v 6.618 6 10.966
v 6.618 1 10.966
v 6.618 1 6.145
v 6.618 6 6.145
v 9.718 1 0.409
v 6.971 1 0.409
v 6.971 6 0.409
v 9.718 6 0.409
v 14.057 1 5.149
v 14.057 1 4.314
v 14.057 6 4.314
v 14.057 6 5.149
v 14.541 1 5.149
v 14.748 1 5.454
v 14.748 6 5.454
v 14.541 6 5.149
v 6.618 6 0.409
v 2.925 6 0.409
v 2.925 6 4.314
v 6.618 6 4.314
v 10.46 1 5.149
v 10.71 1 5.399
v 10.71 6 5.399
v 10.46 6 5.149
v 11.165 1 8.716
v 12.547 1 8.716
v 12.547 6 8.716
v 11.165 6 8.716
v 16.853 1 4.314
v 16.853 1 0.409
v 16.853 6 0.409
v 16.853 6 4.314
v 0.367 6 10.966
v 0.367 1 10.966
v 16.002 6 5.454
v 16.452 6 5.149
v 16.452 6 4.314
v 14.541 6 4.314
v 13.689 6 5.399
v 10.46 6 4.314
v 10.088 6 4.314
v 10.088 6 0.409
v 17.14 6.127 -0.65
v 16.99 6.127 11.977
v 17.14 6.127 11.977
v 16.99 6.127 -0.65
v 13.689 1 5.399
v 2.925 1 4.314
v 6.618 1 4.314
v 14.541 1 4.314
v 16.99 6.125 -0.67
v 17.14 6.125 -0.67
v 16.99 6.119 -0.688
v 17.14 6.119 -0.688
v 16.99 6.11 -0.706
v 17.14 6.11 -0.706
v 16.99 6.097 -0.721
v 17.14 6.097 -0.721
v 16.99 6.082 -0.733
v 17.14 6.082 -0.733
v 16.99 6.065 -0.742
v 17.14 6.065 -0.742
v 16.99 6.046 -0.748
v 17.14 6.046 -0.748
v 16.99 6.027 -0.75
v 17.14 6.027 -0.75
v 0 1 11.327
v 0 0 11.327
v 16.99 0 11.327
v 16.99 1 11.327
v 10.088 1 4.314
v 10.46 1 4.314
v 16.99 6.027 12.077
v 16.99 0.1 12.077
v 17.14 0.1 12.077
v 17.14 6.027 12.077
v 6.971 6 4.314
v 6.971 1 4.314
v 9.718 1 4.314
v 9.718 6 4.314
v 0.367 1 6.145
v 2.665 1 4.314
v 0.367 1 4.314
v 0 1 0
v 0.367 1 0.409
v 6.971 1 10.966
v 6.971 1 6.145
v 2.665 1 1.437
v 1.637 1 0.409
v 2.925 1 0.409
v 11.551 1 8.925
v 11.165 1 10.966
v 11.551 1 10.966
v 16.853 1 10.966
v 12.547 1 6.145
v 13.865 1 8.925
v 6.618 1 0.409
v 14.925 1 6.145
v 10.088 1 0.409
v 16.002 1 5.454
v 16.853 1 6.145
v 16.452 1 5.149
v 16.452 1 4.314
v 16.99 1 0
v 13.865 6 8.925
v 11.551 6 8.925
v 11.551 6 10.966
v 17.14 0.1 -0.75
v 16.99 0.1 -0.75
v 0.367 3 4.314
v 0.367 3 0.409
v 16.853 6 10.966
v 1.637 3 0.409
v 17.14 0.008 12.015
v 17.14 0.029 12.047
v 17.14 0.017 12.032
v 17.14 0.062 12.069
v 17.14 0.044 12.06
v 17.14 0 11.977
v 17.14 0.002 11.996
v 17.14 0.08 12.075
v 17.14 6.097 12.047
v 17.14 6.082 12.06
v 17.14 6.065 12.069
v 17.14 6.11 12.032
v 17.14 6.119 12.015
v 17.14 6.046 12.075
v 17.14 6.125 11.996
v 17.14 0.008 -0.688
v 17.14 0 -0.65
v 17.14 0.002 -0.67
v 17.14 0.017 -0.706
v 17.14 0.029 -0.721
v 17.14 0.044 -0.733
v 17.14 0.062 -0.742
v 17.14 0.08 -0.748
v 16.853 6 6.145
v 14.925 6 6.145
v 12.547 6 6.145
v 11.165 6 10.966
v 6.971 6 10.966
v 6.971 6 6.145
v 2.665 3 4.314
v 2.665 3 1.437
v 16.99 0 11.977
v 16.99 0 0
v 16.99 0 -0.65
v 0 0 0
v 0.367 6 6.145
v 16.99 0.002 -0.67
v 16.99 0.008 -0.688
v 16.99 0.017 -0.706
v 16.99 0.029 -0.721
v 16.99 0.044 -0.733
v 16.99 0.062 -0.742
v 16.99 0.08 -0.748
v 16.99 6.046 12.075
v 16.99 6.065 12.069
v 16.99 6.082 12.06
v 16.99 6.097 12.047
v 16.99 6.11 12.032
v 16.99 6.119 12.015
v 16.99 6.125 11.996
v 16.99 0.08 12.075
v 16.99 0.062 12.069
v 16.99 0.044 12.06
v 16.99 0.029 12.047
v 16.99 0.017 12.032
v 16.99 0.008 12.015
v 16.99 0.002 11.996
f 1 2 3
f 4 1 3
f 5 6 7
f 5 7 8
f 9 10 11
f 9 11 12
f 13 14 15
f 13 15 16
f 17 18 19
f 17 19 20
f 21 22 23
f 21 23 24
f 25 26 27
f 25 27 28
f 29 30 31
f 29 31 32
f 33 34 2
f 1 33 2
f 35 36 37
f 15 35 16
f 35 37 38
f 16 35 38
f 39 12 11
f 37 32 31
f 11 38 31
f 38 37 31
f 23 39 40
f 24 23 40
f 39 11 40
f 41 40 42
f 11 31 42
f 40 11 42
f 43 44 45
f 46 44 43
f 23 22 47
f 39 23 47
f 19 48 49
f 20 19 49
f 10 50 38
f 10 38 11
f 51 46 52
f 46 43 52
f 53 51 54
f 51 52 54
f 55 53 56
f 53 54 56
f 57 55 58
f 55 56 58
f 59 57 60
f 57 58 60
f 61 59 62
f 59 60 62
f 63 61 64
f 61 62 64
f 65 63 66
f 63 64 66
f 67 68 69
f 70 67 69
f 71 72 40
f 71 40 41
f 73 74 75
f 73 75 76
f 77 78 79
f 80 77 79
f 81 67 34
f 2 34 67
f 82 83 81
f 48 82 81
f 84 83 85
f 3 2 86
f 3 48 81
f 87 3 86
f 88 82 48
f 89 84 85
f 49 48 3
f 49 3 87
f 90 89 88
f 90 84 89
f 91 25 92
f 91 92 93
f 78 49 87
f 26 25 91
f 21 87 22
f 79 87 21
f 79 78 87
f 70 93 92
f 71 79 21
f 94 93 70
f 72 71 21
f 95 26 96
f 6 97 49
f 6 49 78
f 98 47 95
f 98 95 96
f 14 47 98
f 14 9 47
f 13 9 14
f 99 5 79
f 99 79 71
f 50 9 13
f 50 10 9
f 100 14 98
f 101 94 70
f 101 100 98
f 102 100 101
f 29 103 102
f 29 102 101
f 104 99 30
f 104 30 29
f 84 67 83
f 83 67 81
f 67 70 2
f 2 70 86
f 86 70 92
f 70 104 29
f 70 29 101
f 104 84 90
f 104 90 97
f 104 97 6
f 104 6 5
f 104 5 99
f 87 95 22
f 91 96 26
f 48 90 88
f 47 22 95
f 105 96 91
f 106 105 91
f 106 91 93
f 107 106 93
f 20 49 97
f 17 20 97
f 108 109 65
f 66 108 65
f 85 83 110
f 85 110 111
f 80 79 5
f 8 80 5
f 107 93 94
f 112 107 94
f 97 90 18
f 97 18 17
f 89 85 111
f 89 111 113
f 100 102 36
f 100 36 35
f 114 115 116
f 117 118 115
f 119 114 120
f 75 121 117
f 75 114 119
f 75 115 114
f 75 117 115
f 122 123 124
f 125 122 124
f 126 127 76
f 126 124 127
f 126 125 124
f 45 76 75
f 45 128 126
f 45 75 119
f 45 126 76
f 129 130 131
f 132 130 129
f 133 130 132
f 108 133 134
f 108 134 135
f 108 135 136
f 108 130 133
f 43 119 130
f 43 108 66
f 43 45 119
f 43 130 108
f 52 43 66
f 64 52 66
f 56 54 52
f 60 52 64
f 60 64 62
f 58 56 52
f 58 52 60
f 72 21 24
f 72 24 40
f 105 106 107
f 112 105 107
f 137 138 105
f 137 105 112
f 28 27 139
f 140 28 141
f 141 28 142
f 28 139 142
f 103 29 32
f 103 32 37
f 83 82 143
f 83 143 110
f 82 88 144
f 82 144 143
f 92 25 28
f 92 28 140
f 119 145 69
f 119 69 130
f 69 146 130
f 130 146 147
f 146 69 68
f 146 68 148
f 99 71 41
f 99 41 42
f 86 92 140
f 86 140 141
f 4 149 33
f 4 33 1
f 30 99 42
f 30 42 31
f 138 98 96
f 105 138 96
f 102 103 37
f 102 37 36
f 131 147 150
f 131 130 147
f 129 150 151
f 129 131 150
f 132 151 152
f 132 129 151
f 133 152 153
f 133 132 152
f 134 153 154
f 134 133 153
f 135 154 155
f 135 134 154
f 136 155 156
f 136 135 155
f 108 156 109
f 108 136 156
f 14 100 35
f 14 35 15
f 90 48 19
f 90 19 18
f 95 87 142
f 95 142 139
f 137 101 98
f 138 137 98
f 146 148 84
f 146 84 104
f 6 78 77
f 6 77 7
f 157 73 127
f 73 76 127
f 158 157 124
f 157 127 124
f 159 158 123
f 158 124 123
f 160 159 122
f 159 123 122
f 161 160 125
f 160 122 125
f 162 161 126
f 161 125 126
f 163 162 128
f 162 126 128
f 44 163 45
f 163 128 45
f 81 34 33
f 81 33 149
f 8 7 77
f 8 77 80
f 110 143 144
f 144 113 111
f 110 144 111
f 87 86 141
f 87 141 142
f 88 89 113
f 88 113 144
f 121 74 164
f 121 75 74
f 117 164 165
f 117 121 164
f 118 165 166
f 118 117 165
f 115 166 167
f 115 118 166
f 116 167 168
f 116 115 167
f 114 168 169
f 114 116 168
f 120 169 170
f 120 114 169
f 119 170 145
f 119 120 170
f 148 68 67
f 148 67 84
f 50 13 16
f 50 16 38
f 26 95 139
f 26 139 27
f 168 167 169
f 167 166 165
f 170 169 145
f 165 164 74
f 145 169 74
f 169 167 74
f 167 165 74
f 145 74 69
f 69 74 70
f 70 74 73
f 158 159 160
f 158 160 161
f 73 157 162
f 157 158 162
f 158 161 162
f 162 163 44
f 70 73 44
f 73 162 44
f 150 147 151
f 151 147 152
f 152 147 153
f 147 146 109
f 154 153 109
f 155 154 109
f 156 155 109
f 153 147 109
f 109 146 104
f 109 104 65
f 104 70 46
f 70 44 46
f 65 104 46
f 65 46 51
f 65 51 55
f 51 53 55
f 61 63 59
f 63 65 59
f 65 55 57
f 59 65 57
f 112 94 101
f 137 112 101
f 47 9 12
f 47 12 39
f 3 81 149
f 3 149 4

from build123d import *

# Parameters (mm, degrees)
SKETCH1_W           = 16.9901
SKETCH1_H           = 11.326733
BOSS_EXTRUDE1_DEPTH = 1
SKETCH2_W           = 12.826733
SKETCH2_H           = 6.1267257
BOSS_EXTRUDE2_DEPTH = 0.15
FILLET2_R           = 0.1
SKETCH3_W           = 6.250546152
SKETCH3_H           = 4.820472611
SKETCH3_W_2         = 2.746840533
SKETCH3_H_2         = 3.904582815
SKETCH3_W_3         = 3.692789168
BOSS_EXTRUDE3_DEPTH = 5
BOSS_EXTRUDE4_DEPTH = 2


with BuildPart() as part:
    # Sketch1 → Boss-Extrude1 (new body)
    with BuildSketch(Plane(origin=(0, 0, 0), x_dir=(1, 0, 0), z_dir=(0, 1, 0))):
        with Locations((8.49505, -5.6633665)):
            Rectangle(SKETCH1_W, SKETCH1_H)
    extrude(amount=BOSS_EXTRUDE1_DEPTH)

    # Sketch2 → Boss-Extrude2 (add)
    with BuildSketch(Plane(origin=(16.9901, 0, 0), x_dir=(0, 0, -1), z_dir=(1, 0, 0))):
        with Locations((-5.6633665, 3.06336285)):
            Rectangle(SKETCH2_W, SKETCH2_H)
    extrude(amount=BOSS_EXTRUDE2_DEPTH)

    # Fillet2
    fillet2_edges = [part.edges().sort_by_distance(p)[0] for p in [
        (17.0651, 6.1267257, 12.076733),
        (17.0651, 0, 12.076733),
        (17.0651, 0, -0.75),
        (17.0651, 6.1267257, -0.75),
    ]]
    fillet(fillet2_edges, radius=FILLET2_R)

    # Sketch3 → Boss-Extrude3 (add)
    with BuildSketch(Plane(origin=(0, 1, 0), x_dir=(1, 0, 0), z_dir=(0, 1, 0))):
        Polygon((6.971259917, -6.145413761), (12.546939904, -6.145413761), (12.546939904, -8.716332487), (11.165071089, -8.716332487), (11.165071089, -10.965886372), (6.971259917, -10.965886372), align=None)
        with Locations((3.492485517, -8.555650067)):
            Rectangle(SKETCH3_W, SKETCH3_H)
        Polygon((16.853228769, -6.145413761), (14.925039725, -6.145413761), (13.864535751, -8.925219633), (11.550708898, -8.925219633), (11.550708898, -10.965886372), (16.853228769, -10.965886372), align=None)
        Polygon((16.853228769, -0.409051354), (16.853228769, -4.313634169), (16.451522719, -4.313634169), (16.451522719, -5.149182755), (16.001611942, -5.454479354), (14.748289063, -5.454479354), (14.541123514, -5.149182755), (14.541123514, -4.313634169), (14.057354655, -4.313634169), (14.057354655, -5.149182755), (13.68878146, -5.399285995), (12.145233853, -5.399285995), (10.709853969, -5.399285995), (10.459750729, -5.149182755), (10.459750729, -4.313634169), (10.088036395, -4.313634169), (10.088036395, -0.409051354), align=None)
        with Locations((8.344680184, -2.361342761)):
            Rectangle(SKETCH3_W_2, SKETCH3_H_2)
        with Locations((4.771364009, -2.361342761)):
            Rectangle(SKETCH3_W_3, SKETCH3_H_2)
    extrude(amount=BOSS_EXTRUDE3_DEPTH)

    # Sketch4 → Boss-Extrude4 (add)
    with BuildSketch(Plane(origin=(0, 1, 0), x_dir=(1, 0, 0), z_dir=(0, 1, 0))):
        Polygon((0.367212441, -4.313634169), (0.367212441, -0.409051354), (1.636603562, -0.409051354), (2.664971052, -1.437418845), (2.664971052, -4.313634169), align=None)
    extrude(amount=BOSS_EXTRUDE4_DEPTH)


solid = part.part
